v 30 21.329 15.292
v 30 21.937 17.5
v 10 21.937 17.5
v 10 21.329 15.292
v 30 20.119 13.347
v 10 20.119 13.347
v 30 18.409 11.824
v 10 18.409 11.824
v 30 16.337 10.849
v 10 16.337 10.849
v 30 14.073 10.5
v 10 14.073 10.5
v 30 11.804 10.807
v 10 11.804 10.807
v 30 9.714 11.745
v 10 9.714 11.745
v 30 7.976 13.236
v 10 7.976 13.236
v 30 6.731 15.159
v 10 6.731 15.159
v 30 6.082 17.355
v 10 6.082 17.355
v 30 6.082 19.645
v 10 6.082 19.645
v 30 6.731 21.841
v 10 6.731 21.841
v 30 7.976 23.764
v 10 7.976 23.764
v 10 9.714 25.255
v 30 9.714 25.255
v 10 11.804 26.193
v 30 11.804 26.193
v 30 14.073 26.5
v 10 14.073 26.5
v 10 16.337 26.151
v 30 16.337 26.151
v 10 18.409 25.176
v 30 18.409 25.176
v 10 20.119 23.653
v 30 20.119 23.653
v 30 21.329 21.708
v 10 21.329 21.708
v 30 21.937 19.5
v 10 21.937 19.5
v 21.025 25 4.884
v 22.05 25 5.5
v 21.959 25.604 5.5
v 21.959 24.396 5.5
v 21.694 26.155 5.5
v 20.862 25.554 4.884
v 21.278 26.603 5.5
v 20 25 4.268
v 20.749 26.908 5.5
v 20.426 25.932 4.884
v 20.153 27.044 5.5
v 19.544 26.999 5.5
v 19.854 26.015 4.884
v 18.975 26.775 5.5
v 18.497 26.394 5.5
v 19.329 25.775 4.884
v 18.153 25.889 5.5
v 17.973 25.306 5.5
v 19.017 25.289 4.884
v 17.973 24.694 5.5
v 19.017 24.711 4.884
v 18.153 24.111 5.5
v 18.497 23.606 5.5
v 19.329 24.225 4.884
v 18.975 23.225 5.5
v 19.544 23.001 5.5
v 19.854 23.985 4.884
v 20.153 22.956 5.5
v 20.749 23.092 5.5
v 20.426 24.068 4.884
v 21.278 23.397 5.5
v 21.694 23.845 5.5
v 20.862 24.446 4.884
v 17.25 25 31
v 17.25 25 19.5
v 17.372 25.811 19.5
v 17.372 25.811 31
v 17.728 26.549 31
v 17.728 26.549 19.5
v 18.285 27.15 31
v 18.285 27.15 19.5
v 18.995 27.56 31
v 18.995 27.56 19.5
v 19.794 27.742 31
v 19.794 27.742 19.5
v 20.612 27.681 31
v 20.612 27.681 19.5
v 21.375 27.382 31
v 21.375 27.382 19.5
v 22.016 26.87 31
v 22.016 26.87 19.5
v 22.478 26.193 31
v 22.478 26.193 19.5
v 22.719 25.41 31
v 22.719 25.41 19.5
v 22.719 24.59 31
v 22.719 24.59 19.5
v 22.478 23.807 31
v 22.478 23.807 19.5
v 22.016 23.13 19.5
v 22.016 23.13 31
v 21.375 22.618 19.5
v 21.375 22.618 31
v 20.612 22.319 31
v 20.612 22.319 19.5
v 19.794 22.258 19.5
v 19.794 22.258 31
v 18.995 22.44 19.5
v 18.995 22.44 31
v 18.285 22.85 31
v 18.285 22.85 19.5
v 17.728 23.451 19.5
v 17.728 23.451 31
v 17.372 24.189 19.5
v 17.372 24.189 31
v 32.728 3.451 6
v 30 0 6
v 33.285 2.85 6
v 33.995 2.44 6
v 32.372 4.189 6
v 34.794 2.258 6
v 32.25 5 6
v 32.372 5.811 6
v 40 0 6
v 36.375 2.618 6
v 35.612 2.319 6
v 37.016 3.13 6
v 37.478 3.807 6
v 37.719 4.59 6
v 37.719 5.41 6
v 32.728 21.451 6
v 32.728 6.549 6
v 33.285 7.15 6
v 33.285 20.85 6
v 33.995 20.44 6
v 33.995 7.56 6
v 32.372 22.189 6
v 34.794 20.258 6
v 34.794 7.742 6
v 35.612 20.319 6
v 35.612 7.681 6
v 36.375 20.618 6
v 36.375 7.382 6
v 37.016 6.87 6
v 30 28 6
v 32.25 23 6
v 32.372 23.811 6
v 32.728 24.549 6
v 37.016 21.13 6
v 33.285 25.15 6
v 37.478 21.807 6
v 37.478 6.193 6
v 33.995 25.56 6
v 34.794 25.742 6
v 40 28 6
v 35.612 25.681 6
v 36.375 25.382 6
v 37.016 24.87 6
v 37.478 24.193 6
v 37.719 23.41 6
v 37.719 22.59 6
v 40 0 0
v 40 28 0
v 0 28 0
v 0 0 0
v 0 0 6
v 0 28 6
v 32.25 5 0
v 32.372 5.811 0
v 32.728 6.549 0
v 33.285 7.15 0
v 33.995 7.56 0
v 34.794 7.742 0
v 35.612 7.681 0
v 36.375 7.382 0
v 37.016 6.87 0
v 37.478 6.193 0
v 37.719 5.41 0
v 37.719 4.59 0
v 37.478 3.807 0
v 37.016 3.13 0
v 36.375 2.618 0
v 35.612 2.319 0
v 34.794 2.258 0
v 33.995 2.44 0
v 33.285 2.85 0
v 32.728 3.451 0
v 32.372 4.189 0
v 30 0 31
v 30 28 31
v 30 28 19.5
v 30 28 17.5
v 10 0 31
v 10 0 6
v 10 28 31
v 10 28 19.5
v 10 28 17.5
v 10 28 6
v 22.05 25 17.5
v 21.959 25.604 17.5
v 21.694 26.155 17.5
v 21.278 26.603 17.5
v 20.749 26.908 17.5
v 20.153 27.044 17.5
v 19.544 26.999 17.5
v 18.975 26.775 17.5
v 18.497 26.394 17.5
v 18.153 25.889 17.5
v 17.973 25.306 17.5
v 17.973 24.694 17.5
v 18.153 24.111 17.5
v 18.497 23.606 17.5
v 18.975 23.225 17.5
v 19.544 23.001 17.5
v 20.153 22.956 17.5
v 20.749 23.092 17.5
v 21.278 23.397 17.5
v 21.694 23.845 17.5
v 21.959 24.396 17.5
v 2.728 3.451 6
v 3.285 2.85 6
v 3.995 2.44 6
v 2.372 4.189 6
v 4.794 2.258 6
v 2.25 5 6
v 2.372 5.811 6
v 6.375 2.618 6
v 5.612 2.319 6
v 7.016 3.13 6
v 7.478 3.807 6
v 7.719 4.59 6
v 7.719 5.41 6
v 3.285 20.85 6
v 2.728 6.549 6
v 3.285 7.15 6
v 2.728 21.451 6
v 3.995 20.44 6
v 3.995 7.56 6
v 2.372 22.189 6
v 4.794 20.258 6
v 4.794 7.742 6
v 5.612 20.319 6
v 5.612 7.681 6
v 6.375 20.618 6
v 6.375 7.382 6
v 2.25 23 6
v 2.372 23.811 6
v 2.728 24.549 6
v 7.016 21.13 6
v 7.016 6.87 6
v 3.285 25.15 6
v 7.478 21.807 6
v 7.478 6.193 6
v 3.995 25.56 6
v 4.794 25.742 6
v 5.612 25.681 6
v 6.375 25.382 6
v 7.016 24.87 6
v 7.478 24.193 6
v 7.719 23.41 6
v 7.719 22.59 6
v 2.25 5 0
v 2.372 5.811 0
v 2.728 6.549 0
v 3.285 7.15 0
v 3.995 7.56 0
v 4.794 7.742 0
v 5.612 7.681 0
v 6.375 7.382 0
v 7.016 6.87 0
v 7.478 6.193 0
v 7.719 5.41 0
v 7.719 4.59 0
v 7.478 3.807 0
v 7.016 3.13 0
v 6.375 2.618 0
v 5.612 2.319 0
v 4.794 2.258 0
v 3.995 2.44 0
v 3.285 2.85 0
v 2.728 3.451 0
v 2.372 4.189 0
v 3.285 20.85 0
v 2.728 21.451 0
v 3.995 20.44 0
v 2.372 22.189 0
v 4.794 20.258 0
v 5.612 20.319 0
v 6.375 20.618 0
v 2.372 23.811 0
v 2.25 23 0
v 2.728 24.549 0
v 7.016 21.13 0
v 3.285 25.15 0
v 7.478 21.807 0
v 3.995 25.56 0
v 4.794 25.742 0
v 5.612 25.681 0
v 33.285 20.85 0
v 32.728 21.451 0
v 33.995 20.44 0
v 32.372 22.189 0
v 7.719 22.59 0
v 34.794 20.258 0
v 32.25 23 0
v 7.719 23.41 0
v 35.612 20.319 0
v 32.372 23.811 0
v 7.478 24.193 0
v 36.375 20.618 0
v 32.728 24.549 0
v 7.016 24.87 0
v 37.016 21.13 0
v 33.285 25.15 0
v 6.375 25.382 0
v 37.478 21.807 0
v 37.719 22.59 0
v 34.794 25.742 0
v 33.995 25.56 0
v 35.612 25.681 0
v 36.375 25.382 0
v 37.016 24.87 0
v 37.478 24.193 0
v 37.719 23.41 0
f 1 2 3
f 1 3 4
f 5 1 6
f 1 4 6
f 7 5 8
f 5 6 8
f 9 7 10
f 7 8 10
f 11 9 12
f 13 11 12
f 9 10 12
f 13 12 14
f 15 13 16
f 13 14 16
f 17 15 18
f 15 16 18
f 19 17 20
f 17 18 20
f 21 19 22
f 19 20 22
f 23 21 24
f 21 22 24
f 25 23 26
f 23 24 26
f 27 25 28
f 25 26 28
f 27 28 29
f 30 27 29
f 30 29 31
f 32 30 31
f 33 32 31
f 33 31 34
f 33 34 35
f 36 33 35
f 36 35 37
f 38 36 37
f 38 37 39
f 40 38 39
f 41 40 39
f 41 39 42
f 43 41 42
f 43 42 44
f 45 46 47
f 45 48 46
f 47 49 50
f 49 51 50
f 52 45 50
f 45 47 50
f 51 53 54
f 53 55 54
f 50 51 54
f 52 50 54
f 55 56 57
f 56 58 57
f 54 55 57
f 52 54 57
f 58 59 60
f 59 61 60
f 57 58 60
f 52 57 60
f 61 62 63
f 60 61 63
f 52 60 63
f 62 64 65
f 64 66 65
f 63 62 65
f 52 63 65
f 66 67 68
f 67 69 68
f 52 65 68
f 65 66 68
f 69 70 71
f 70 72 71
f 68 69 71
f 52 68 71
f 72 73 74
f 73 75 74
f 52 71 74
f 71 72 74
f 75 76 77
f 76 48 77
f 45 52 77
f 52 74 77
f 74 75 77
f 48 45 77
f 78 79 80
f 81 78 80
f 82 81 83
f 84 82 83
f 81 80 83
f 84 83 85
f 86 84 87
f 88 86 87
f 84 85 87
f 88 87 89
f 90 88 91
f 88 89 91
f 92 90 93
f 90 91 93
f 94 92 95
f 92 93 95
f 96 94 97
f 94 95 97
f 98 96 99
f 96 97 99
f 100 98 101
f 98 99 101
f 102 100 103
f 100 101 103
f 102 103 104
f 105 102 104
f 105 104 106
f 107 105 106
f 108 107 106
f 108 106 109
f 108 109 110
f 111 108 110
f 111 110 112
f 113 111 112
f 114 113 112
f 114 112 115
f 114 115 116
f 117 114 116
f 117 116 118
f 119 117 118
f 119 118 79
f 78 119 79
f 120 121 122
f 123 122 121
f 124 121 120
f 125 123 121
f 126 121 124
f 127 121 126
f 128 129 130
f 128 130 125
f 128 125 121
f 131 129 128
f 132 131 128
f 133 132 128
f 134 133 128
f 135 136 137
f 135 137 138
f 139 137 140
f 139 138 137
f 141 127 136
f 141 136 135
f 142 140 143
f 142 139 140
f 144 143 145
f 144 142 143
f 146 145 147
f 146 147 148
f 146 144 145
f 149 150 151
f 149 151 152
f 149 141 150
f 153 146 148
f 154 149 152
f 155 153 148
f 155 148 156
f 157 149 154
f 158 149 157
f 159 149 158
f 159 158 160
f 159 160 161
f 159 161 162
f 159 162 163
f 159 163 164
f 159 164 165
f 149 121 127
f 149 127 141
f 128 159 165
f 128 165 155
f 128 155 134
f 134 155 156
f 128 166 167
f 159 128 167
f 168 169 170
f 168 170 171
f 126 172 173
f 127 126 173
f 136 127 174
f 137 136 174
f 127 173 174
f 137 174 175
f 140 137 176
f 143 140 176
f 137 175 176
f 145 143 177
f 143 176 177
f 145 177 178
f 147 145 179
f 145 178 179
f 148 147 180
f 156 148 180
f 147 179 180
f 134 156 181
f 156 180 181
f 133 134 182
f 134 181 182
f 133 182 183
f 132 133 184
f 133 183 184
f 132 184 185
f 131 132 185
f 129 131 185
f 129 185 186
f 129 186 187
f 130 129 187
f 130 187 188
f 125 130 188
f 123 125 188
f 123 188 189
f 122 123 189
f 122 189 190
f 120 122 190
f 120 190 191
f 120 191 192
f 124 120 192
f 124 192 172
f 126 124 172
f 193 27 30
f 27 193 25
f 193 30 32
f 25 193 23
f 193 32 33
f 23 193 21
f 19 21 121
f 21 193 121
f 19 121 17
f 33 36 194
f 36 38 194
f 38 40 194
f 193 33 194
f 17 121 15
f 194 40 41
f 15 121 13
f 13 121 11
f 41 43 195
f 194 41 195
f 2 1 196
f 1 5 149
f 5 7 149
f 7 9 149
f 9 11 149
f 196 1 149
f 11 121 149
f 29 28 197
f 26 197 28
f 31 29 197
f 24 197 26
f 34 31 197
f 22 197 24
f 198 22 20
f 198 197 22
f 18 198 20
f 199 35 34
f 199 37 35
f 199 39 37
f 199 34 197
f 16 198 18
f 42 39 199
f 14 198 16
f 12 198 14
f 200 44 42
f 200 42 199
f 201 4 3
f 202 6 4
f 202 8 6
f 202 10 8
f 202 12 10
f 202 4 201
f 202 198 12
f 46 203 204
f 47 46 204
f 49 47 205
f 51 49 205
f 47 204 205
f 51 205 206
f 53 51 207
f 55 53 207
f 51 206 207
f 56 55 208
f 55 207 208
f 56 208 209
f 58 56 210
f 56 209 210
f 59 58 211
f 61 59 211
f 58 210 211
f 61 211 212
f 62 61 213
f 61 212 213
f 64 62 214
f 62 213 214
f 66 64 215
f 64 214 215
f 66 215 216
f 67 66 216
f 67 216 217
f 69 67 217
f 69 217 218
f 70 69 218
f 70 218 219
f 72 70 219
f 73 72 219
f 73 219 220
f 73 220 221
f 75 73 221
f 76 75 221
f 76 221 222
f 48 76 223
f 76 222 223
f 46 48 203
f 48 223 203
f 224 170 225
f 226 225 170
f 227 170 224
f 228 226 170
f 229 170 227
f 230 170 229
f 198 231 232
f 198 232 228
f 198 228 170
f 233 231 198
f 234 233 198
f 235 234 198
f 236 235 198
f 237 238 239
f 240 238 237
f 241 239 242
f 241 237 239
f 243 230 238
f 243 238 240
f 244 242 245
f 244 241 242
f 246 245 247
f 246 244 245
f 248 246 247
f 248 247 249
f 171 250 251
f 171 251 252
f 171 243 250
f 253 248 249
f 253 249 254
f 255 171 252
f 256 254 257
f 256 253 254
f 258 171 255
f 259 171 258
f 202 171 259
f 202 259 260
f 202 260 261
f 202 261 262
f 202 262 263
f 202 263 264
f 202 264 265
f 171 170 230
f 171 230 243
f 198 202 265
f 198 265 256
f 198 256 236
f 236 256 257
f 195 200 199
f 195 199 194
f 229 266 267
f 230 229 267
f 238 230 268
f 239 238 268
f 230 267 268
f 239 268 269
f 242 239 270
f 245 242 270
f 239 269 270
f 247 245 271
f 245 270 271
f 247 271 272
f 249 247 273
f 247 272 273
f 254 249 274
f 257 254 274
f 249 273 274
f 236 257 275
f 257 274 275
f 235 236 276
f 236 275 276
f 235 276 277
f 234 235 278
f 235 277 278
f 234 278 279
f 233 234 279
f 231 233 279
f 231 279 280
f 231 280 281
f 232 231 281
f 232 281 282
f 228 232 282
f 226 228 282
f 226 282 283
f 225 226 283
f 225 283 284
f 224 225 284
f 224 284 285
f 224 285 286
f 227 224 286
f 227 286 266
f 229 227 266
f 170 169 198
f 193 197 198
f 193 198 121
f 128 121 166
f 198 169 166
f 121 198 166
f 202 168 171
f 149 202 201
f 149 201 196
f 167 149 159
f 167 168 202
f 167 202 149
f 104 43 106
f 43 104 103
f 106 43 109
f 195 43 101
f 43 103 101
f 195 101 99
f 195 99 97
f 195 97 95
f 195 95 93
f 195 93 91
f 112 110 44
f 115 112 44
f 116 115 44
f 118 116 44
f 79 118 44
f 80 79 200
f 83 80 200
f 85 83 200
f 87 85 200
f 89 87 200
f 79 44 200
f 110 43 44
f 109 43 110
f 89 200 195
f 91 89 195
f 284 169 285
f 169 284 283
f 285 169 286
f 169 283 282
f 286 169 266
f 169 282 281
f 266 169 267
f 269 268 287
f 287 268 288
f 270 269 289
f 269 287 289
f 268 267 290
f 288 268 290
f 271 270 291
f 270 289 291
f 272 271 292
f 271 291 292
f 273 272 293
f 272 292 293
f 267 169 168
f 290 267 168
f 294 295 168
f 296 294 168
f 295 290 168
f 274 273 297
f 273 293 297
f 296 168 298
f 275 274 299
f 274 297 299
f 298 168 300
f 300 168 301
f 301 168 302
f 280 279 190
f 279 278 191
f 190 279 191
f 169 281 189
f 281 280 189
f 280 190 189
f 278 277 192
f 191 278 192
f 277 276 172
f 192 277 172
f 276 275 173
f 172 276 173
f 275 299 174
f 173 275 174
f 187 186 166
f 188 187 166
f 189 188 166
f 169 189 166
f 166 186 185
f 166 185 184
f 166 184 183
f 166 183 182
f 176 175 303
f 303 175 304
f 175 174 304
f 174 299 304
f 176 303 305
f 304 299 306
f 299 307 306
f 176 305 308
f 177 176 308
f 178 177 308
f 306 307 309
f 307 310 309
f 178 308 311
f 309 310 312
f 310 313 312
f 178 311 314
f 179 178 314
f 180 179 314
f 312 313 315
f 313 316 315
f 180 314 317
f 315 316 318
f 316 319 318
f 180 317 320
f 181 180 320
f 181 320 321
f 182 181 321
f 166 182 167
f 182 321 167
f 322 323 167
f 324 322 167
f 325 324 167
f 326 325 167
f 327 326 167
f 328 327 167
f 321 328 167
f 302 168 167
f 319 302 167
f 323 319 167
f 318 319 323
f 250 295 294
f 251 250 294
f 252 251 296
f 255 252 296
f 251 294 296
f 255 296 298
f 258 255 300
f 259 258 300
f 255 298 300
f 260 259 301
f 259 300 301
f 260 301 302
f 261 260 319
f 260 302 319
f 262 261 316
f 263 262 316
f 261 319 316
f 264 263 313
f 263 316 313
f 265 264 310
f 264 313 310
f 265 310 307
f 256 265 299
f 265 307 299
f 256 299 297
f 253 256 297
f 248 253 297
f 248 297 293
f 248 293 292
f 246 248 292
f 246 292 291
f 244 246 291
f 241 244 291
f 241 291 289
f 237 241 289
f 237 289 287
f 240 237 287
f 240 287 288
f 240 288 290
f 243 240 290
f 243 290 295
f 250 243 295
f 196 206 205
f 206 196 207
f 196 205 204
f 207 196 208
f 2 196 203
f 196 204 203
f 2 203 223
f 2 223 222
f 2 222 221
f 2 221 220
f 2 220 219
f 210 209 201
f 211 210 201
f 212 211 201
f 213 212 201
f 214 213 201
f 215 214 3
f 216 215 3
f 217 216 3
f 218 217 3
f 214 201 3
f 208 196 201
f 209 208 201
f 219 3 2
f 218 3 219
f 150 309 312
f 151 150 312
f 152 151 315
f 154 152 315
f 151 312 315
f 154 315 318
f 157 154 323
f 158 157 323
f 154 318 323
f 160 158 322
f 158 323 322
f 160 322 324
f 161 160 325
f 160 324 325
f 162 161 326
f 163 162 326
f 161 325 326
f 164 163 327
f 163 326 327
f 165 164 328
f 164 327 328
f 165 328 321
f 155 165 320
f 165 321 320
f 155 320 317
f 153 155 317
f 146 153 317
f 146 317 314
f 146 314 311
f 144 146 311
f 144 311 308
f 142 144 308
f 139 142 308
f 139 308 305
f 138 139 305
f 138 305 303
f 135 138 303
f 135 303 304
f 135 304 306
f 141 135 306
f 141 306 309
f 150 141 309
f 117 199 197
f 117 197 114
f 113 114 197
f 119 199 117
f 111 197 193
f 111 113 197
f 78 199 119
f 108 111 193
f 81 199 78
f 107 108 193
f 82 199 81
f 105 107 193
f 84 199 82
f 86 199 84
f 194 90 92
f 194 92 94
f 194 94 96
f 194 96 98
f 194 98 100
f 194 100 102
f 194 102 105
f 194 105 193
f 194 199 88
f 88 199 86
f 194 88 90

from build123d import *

# Parameters (mm, degrees)
F0_W      = 40
F0_H      = 28
F1_DEPTH  = 6
F2_W      = 20
F2_H      = 28
F3_DEPTH  = 25
F5_DEPTH  = 30.001
F7_D      = 4.1
F7_DEPTH  = 12
F7_TIP    = 1.231764269
F9_D      = 5.5
F9_DEPTH  = 12
F9_TIP    = 1.6523667023
F11_D     = 5.5
F11_DEPTH = 12
F11_TIP   = 1.6523667023


with BuildPart() as f1:
    # F0 (on Top) → F1 (new body)
    with BuildSketch(Plane.XY):
        with Locations((20, 14)):
            Rectangle(F0_W, F0_H)
    extrude(amount=F1_DEPTH)

    # F2 (on face) → F3 (join)
    with BuildSketch(Plane.XY.offset(6)):
        with Locations((20, 14)):
            Rectangle(F2_W, F2_H)
    extrude(amount=F3_DEPTH)

    # F4 (on face) → F5 (cut, through all)
    with BuildSketch(Plane(origin=(10, 0, 0), x_dir=(0, -1, 0), z_dir=(-1, 0, 0))):
        with BuildLine():
            Line((-28, 17.5), (-21.9372539332, 17.5))
            ThreePointArc((-21.9372539332, 17.5), (-6, 18.5), (-21.9372539332, 19.5))
            Line((-21.9372539332, 19.5), (-28, 19.5))
            Line((-28, 19.5), (-28, 17.5))
        make_face()
    extrude(amount=-F5_DEPTH, mode=Mode.SUBTRACT)

    # F7 (one way)
    with BuildSketch(Plane.XY.offset(17.5)):
        with Locations((20, 25)):
            Circle(F7_D / 2)
    extrude(amount=-F7_DEPTH, mode=Mode.SUBTRACT)
    with Locations(Plane.XY.offset(17.5)):
        with Locations((20, 25)):
            with Locations((0, 0, -(F7_DEPTH + F7_TIP / 2))):  # 118° drill point
                Cone(0, F7_D / 2, F7_TIP, mode=Mode.SUBTRACT)

    # F9
    with Locations(Plane.XY.offset(31)):
        with Locations((20, 25)):
            Hole(F9_D / 2, depth=F9_DEPTH)
            with Locations((0, 0, -(F9_DEPTH + F9_TIP / 2))):  # 118° drill point
                Cone(0, F9_D / 2, F9_TIP, mode=Mode.SUBTRACT)

    # F11
    with Locations(Plane.XY.offset(6)):
        with Locations((5, 5), (5, 23), (35, 23), (35, 5)):
            Hole(F11_D / 2, depth=F11_DEPTH)
            with Locations((0, 0, -(F11_DEPTH + F11_TIP / 2))):  # 118° drill point
                Cone(0, F11_D / 2, F11_TIP, mode=Mode.SUBTRACT)


solid = f1.part
